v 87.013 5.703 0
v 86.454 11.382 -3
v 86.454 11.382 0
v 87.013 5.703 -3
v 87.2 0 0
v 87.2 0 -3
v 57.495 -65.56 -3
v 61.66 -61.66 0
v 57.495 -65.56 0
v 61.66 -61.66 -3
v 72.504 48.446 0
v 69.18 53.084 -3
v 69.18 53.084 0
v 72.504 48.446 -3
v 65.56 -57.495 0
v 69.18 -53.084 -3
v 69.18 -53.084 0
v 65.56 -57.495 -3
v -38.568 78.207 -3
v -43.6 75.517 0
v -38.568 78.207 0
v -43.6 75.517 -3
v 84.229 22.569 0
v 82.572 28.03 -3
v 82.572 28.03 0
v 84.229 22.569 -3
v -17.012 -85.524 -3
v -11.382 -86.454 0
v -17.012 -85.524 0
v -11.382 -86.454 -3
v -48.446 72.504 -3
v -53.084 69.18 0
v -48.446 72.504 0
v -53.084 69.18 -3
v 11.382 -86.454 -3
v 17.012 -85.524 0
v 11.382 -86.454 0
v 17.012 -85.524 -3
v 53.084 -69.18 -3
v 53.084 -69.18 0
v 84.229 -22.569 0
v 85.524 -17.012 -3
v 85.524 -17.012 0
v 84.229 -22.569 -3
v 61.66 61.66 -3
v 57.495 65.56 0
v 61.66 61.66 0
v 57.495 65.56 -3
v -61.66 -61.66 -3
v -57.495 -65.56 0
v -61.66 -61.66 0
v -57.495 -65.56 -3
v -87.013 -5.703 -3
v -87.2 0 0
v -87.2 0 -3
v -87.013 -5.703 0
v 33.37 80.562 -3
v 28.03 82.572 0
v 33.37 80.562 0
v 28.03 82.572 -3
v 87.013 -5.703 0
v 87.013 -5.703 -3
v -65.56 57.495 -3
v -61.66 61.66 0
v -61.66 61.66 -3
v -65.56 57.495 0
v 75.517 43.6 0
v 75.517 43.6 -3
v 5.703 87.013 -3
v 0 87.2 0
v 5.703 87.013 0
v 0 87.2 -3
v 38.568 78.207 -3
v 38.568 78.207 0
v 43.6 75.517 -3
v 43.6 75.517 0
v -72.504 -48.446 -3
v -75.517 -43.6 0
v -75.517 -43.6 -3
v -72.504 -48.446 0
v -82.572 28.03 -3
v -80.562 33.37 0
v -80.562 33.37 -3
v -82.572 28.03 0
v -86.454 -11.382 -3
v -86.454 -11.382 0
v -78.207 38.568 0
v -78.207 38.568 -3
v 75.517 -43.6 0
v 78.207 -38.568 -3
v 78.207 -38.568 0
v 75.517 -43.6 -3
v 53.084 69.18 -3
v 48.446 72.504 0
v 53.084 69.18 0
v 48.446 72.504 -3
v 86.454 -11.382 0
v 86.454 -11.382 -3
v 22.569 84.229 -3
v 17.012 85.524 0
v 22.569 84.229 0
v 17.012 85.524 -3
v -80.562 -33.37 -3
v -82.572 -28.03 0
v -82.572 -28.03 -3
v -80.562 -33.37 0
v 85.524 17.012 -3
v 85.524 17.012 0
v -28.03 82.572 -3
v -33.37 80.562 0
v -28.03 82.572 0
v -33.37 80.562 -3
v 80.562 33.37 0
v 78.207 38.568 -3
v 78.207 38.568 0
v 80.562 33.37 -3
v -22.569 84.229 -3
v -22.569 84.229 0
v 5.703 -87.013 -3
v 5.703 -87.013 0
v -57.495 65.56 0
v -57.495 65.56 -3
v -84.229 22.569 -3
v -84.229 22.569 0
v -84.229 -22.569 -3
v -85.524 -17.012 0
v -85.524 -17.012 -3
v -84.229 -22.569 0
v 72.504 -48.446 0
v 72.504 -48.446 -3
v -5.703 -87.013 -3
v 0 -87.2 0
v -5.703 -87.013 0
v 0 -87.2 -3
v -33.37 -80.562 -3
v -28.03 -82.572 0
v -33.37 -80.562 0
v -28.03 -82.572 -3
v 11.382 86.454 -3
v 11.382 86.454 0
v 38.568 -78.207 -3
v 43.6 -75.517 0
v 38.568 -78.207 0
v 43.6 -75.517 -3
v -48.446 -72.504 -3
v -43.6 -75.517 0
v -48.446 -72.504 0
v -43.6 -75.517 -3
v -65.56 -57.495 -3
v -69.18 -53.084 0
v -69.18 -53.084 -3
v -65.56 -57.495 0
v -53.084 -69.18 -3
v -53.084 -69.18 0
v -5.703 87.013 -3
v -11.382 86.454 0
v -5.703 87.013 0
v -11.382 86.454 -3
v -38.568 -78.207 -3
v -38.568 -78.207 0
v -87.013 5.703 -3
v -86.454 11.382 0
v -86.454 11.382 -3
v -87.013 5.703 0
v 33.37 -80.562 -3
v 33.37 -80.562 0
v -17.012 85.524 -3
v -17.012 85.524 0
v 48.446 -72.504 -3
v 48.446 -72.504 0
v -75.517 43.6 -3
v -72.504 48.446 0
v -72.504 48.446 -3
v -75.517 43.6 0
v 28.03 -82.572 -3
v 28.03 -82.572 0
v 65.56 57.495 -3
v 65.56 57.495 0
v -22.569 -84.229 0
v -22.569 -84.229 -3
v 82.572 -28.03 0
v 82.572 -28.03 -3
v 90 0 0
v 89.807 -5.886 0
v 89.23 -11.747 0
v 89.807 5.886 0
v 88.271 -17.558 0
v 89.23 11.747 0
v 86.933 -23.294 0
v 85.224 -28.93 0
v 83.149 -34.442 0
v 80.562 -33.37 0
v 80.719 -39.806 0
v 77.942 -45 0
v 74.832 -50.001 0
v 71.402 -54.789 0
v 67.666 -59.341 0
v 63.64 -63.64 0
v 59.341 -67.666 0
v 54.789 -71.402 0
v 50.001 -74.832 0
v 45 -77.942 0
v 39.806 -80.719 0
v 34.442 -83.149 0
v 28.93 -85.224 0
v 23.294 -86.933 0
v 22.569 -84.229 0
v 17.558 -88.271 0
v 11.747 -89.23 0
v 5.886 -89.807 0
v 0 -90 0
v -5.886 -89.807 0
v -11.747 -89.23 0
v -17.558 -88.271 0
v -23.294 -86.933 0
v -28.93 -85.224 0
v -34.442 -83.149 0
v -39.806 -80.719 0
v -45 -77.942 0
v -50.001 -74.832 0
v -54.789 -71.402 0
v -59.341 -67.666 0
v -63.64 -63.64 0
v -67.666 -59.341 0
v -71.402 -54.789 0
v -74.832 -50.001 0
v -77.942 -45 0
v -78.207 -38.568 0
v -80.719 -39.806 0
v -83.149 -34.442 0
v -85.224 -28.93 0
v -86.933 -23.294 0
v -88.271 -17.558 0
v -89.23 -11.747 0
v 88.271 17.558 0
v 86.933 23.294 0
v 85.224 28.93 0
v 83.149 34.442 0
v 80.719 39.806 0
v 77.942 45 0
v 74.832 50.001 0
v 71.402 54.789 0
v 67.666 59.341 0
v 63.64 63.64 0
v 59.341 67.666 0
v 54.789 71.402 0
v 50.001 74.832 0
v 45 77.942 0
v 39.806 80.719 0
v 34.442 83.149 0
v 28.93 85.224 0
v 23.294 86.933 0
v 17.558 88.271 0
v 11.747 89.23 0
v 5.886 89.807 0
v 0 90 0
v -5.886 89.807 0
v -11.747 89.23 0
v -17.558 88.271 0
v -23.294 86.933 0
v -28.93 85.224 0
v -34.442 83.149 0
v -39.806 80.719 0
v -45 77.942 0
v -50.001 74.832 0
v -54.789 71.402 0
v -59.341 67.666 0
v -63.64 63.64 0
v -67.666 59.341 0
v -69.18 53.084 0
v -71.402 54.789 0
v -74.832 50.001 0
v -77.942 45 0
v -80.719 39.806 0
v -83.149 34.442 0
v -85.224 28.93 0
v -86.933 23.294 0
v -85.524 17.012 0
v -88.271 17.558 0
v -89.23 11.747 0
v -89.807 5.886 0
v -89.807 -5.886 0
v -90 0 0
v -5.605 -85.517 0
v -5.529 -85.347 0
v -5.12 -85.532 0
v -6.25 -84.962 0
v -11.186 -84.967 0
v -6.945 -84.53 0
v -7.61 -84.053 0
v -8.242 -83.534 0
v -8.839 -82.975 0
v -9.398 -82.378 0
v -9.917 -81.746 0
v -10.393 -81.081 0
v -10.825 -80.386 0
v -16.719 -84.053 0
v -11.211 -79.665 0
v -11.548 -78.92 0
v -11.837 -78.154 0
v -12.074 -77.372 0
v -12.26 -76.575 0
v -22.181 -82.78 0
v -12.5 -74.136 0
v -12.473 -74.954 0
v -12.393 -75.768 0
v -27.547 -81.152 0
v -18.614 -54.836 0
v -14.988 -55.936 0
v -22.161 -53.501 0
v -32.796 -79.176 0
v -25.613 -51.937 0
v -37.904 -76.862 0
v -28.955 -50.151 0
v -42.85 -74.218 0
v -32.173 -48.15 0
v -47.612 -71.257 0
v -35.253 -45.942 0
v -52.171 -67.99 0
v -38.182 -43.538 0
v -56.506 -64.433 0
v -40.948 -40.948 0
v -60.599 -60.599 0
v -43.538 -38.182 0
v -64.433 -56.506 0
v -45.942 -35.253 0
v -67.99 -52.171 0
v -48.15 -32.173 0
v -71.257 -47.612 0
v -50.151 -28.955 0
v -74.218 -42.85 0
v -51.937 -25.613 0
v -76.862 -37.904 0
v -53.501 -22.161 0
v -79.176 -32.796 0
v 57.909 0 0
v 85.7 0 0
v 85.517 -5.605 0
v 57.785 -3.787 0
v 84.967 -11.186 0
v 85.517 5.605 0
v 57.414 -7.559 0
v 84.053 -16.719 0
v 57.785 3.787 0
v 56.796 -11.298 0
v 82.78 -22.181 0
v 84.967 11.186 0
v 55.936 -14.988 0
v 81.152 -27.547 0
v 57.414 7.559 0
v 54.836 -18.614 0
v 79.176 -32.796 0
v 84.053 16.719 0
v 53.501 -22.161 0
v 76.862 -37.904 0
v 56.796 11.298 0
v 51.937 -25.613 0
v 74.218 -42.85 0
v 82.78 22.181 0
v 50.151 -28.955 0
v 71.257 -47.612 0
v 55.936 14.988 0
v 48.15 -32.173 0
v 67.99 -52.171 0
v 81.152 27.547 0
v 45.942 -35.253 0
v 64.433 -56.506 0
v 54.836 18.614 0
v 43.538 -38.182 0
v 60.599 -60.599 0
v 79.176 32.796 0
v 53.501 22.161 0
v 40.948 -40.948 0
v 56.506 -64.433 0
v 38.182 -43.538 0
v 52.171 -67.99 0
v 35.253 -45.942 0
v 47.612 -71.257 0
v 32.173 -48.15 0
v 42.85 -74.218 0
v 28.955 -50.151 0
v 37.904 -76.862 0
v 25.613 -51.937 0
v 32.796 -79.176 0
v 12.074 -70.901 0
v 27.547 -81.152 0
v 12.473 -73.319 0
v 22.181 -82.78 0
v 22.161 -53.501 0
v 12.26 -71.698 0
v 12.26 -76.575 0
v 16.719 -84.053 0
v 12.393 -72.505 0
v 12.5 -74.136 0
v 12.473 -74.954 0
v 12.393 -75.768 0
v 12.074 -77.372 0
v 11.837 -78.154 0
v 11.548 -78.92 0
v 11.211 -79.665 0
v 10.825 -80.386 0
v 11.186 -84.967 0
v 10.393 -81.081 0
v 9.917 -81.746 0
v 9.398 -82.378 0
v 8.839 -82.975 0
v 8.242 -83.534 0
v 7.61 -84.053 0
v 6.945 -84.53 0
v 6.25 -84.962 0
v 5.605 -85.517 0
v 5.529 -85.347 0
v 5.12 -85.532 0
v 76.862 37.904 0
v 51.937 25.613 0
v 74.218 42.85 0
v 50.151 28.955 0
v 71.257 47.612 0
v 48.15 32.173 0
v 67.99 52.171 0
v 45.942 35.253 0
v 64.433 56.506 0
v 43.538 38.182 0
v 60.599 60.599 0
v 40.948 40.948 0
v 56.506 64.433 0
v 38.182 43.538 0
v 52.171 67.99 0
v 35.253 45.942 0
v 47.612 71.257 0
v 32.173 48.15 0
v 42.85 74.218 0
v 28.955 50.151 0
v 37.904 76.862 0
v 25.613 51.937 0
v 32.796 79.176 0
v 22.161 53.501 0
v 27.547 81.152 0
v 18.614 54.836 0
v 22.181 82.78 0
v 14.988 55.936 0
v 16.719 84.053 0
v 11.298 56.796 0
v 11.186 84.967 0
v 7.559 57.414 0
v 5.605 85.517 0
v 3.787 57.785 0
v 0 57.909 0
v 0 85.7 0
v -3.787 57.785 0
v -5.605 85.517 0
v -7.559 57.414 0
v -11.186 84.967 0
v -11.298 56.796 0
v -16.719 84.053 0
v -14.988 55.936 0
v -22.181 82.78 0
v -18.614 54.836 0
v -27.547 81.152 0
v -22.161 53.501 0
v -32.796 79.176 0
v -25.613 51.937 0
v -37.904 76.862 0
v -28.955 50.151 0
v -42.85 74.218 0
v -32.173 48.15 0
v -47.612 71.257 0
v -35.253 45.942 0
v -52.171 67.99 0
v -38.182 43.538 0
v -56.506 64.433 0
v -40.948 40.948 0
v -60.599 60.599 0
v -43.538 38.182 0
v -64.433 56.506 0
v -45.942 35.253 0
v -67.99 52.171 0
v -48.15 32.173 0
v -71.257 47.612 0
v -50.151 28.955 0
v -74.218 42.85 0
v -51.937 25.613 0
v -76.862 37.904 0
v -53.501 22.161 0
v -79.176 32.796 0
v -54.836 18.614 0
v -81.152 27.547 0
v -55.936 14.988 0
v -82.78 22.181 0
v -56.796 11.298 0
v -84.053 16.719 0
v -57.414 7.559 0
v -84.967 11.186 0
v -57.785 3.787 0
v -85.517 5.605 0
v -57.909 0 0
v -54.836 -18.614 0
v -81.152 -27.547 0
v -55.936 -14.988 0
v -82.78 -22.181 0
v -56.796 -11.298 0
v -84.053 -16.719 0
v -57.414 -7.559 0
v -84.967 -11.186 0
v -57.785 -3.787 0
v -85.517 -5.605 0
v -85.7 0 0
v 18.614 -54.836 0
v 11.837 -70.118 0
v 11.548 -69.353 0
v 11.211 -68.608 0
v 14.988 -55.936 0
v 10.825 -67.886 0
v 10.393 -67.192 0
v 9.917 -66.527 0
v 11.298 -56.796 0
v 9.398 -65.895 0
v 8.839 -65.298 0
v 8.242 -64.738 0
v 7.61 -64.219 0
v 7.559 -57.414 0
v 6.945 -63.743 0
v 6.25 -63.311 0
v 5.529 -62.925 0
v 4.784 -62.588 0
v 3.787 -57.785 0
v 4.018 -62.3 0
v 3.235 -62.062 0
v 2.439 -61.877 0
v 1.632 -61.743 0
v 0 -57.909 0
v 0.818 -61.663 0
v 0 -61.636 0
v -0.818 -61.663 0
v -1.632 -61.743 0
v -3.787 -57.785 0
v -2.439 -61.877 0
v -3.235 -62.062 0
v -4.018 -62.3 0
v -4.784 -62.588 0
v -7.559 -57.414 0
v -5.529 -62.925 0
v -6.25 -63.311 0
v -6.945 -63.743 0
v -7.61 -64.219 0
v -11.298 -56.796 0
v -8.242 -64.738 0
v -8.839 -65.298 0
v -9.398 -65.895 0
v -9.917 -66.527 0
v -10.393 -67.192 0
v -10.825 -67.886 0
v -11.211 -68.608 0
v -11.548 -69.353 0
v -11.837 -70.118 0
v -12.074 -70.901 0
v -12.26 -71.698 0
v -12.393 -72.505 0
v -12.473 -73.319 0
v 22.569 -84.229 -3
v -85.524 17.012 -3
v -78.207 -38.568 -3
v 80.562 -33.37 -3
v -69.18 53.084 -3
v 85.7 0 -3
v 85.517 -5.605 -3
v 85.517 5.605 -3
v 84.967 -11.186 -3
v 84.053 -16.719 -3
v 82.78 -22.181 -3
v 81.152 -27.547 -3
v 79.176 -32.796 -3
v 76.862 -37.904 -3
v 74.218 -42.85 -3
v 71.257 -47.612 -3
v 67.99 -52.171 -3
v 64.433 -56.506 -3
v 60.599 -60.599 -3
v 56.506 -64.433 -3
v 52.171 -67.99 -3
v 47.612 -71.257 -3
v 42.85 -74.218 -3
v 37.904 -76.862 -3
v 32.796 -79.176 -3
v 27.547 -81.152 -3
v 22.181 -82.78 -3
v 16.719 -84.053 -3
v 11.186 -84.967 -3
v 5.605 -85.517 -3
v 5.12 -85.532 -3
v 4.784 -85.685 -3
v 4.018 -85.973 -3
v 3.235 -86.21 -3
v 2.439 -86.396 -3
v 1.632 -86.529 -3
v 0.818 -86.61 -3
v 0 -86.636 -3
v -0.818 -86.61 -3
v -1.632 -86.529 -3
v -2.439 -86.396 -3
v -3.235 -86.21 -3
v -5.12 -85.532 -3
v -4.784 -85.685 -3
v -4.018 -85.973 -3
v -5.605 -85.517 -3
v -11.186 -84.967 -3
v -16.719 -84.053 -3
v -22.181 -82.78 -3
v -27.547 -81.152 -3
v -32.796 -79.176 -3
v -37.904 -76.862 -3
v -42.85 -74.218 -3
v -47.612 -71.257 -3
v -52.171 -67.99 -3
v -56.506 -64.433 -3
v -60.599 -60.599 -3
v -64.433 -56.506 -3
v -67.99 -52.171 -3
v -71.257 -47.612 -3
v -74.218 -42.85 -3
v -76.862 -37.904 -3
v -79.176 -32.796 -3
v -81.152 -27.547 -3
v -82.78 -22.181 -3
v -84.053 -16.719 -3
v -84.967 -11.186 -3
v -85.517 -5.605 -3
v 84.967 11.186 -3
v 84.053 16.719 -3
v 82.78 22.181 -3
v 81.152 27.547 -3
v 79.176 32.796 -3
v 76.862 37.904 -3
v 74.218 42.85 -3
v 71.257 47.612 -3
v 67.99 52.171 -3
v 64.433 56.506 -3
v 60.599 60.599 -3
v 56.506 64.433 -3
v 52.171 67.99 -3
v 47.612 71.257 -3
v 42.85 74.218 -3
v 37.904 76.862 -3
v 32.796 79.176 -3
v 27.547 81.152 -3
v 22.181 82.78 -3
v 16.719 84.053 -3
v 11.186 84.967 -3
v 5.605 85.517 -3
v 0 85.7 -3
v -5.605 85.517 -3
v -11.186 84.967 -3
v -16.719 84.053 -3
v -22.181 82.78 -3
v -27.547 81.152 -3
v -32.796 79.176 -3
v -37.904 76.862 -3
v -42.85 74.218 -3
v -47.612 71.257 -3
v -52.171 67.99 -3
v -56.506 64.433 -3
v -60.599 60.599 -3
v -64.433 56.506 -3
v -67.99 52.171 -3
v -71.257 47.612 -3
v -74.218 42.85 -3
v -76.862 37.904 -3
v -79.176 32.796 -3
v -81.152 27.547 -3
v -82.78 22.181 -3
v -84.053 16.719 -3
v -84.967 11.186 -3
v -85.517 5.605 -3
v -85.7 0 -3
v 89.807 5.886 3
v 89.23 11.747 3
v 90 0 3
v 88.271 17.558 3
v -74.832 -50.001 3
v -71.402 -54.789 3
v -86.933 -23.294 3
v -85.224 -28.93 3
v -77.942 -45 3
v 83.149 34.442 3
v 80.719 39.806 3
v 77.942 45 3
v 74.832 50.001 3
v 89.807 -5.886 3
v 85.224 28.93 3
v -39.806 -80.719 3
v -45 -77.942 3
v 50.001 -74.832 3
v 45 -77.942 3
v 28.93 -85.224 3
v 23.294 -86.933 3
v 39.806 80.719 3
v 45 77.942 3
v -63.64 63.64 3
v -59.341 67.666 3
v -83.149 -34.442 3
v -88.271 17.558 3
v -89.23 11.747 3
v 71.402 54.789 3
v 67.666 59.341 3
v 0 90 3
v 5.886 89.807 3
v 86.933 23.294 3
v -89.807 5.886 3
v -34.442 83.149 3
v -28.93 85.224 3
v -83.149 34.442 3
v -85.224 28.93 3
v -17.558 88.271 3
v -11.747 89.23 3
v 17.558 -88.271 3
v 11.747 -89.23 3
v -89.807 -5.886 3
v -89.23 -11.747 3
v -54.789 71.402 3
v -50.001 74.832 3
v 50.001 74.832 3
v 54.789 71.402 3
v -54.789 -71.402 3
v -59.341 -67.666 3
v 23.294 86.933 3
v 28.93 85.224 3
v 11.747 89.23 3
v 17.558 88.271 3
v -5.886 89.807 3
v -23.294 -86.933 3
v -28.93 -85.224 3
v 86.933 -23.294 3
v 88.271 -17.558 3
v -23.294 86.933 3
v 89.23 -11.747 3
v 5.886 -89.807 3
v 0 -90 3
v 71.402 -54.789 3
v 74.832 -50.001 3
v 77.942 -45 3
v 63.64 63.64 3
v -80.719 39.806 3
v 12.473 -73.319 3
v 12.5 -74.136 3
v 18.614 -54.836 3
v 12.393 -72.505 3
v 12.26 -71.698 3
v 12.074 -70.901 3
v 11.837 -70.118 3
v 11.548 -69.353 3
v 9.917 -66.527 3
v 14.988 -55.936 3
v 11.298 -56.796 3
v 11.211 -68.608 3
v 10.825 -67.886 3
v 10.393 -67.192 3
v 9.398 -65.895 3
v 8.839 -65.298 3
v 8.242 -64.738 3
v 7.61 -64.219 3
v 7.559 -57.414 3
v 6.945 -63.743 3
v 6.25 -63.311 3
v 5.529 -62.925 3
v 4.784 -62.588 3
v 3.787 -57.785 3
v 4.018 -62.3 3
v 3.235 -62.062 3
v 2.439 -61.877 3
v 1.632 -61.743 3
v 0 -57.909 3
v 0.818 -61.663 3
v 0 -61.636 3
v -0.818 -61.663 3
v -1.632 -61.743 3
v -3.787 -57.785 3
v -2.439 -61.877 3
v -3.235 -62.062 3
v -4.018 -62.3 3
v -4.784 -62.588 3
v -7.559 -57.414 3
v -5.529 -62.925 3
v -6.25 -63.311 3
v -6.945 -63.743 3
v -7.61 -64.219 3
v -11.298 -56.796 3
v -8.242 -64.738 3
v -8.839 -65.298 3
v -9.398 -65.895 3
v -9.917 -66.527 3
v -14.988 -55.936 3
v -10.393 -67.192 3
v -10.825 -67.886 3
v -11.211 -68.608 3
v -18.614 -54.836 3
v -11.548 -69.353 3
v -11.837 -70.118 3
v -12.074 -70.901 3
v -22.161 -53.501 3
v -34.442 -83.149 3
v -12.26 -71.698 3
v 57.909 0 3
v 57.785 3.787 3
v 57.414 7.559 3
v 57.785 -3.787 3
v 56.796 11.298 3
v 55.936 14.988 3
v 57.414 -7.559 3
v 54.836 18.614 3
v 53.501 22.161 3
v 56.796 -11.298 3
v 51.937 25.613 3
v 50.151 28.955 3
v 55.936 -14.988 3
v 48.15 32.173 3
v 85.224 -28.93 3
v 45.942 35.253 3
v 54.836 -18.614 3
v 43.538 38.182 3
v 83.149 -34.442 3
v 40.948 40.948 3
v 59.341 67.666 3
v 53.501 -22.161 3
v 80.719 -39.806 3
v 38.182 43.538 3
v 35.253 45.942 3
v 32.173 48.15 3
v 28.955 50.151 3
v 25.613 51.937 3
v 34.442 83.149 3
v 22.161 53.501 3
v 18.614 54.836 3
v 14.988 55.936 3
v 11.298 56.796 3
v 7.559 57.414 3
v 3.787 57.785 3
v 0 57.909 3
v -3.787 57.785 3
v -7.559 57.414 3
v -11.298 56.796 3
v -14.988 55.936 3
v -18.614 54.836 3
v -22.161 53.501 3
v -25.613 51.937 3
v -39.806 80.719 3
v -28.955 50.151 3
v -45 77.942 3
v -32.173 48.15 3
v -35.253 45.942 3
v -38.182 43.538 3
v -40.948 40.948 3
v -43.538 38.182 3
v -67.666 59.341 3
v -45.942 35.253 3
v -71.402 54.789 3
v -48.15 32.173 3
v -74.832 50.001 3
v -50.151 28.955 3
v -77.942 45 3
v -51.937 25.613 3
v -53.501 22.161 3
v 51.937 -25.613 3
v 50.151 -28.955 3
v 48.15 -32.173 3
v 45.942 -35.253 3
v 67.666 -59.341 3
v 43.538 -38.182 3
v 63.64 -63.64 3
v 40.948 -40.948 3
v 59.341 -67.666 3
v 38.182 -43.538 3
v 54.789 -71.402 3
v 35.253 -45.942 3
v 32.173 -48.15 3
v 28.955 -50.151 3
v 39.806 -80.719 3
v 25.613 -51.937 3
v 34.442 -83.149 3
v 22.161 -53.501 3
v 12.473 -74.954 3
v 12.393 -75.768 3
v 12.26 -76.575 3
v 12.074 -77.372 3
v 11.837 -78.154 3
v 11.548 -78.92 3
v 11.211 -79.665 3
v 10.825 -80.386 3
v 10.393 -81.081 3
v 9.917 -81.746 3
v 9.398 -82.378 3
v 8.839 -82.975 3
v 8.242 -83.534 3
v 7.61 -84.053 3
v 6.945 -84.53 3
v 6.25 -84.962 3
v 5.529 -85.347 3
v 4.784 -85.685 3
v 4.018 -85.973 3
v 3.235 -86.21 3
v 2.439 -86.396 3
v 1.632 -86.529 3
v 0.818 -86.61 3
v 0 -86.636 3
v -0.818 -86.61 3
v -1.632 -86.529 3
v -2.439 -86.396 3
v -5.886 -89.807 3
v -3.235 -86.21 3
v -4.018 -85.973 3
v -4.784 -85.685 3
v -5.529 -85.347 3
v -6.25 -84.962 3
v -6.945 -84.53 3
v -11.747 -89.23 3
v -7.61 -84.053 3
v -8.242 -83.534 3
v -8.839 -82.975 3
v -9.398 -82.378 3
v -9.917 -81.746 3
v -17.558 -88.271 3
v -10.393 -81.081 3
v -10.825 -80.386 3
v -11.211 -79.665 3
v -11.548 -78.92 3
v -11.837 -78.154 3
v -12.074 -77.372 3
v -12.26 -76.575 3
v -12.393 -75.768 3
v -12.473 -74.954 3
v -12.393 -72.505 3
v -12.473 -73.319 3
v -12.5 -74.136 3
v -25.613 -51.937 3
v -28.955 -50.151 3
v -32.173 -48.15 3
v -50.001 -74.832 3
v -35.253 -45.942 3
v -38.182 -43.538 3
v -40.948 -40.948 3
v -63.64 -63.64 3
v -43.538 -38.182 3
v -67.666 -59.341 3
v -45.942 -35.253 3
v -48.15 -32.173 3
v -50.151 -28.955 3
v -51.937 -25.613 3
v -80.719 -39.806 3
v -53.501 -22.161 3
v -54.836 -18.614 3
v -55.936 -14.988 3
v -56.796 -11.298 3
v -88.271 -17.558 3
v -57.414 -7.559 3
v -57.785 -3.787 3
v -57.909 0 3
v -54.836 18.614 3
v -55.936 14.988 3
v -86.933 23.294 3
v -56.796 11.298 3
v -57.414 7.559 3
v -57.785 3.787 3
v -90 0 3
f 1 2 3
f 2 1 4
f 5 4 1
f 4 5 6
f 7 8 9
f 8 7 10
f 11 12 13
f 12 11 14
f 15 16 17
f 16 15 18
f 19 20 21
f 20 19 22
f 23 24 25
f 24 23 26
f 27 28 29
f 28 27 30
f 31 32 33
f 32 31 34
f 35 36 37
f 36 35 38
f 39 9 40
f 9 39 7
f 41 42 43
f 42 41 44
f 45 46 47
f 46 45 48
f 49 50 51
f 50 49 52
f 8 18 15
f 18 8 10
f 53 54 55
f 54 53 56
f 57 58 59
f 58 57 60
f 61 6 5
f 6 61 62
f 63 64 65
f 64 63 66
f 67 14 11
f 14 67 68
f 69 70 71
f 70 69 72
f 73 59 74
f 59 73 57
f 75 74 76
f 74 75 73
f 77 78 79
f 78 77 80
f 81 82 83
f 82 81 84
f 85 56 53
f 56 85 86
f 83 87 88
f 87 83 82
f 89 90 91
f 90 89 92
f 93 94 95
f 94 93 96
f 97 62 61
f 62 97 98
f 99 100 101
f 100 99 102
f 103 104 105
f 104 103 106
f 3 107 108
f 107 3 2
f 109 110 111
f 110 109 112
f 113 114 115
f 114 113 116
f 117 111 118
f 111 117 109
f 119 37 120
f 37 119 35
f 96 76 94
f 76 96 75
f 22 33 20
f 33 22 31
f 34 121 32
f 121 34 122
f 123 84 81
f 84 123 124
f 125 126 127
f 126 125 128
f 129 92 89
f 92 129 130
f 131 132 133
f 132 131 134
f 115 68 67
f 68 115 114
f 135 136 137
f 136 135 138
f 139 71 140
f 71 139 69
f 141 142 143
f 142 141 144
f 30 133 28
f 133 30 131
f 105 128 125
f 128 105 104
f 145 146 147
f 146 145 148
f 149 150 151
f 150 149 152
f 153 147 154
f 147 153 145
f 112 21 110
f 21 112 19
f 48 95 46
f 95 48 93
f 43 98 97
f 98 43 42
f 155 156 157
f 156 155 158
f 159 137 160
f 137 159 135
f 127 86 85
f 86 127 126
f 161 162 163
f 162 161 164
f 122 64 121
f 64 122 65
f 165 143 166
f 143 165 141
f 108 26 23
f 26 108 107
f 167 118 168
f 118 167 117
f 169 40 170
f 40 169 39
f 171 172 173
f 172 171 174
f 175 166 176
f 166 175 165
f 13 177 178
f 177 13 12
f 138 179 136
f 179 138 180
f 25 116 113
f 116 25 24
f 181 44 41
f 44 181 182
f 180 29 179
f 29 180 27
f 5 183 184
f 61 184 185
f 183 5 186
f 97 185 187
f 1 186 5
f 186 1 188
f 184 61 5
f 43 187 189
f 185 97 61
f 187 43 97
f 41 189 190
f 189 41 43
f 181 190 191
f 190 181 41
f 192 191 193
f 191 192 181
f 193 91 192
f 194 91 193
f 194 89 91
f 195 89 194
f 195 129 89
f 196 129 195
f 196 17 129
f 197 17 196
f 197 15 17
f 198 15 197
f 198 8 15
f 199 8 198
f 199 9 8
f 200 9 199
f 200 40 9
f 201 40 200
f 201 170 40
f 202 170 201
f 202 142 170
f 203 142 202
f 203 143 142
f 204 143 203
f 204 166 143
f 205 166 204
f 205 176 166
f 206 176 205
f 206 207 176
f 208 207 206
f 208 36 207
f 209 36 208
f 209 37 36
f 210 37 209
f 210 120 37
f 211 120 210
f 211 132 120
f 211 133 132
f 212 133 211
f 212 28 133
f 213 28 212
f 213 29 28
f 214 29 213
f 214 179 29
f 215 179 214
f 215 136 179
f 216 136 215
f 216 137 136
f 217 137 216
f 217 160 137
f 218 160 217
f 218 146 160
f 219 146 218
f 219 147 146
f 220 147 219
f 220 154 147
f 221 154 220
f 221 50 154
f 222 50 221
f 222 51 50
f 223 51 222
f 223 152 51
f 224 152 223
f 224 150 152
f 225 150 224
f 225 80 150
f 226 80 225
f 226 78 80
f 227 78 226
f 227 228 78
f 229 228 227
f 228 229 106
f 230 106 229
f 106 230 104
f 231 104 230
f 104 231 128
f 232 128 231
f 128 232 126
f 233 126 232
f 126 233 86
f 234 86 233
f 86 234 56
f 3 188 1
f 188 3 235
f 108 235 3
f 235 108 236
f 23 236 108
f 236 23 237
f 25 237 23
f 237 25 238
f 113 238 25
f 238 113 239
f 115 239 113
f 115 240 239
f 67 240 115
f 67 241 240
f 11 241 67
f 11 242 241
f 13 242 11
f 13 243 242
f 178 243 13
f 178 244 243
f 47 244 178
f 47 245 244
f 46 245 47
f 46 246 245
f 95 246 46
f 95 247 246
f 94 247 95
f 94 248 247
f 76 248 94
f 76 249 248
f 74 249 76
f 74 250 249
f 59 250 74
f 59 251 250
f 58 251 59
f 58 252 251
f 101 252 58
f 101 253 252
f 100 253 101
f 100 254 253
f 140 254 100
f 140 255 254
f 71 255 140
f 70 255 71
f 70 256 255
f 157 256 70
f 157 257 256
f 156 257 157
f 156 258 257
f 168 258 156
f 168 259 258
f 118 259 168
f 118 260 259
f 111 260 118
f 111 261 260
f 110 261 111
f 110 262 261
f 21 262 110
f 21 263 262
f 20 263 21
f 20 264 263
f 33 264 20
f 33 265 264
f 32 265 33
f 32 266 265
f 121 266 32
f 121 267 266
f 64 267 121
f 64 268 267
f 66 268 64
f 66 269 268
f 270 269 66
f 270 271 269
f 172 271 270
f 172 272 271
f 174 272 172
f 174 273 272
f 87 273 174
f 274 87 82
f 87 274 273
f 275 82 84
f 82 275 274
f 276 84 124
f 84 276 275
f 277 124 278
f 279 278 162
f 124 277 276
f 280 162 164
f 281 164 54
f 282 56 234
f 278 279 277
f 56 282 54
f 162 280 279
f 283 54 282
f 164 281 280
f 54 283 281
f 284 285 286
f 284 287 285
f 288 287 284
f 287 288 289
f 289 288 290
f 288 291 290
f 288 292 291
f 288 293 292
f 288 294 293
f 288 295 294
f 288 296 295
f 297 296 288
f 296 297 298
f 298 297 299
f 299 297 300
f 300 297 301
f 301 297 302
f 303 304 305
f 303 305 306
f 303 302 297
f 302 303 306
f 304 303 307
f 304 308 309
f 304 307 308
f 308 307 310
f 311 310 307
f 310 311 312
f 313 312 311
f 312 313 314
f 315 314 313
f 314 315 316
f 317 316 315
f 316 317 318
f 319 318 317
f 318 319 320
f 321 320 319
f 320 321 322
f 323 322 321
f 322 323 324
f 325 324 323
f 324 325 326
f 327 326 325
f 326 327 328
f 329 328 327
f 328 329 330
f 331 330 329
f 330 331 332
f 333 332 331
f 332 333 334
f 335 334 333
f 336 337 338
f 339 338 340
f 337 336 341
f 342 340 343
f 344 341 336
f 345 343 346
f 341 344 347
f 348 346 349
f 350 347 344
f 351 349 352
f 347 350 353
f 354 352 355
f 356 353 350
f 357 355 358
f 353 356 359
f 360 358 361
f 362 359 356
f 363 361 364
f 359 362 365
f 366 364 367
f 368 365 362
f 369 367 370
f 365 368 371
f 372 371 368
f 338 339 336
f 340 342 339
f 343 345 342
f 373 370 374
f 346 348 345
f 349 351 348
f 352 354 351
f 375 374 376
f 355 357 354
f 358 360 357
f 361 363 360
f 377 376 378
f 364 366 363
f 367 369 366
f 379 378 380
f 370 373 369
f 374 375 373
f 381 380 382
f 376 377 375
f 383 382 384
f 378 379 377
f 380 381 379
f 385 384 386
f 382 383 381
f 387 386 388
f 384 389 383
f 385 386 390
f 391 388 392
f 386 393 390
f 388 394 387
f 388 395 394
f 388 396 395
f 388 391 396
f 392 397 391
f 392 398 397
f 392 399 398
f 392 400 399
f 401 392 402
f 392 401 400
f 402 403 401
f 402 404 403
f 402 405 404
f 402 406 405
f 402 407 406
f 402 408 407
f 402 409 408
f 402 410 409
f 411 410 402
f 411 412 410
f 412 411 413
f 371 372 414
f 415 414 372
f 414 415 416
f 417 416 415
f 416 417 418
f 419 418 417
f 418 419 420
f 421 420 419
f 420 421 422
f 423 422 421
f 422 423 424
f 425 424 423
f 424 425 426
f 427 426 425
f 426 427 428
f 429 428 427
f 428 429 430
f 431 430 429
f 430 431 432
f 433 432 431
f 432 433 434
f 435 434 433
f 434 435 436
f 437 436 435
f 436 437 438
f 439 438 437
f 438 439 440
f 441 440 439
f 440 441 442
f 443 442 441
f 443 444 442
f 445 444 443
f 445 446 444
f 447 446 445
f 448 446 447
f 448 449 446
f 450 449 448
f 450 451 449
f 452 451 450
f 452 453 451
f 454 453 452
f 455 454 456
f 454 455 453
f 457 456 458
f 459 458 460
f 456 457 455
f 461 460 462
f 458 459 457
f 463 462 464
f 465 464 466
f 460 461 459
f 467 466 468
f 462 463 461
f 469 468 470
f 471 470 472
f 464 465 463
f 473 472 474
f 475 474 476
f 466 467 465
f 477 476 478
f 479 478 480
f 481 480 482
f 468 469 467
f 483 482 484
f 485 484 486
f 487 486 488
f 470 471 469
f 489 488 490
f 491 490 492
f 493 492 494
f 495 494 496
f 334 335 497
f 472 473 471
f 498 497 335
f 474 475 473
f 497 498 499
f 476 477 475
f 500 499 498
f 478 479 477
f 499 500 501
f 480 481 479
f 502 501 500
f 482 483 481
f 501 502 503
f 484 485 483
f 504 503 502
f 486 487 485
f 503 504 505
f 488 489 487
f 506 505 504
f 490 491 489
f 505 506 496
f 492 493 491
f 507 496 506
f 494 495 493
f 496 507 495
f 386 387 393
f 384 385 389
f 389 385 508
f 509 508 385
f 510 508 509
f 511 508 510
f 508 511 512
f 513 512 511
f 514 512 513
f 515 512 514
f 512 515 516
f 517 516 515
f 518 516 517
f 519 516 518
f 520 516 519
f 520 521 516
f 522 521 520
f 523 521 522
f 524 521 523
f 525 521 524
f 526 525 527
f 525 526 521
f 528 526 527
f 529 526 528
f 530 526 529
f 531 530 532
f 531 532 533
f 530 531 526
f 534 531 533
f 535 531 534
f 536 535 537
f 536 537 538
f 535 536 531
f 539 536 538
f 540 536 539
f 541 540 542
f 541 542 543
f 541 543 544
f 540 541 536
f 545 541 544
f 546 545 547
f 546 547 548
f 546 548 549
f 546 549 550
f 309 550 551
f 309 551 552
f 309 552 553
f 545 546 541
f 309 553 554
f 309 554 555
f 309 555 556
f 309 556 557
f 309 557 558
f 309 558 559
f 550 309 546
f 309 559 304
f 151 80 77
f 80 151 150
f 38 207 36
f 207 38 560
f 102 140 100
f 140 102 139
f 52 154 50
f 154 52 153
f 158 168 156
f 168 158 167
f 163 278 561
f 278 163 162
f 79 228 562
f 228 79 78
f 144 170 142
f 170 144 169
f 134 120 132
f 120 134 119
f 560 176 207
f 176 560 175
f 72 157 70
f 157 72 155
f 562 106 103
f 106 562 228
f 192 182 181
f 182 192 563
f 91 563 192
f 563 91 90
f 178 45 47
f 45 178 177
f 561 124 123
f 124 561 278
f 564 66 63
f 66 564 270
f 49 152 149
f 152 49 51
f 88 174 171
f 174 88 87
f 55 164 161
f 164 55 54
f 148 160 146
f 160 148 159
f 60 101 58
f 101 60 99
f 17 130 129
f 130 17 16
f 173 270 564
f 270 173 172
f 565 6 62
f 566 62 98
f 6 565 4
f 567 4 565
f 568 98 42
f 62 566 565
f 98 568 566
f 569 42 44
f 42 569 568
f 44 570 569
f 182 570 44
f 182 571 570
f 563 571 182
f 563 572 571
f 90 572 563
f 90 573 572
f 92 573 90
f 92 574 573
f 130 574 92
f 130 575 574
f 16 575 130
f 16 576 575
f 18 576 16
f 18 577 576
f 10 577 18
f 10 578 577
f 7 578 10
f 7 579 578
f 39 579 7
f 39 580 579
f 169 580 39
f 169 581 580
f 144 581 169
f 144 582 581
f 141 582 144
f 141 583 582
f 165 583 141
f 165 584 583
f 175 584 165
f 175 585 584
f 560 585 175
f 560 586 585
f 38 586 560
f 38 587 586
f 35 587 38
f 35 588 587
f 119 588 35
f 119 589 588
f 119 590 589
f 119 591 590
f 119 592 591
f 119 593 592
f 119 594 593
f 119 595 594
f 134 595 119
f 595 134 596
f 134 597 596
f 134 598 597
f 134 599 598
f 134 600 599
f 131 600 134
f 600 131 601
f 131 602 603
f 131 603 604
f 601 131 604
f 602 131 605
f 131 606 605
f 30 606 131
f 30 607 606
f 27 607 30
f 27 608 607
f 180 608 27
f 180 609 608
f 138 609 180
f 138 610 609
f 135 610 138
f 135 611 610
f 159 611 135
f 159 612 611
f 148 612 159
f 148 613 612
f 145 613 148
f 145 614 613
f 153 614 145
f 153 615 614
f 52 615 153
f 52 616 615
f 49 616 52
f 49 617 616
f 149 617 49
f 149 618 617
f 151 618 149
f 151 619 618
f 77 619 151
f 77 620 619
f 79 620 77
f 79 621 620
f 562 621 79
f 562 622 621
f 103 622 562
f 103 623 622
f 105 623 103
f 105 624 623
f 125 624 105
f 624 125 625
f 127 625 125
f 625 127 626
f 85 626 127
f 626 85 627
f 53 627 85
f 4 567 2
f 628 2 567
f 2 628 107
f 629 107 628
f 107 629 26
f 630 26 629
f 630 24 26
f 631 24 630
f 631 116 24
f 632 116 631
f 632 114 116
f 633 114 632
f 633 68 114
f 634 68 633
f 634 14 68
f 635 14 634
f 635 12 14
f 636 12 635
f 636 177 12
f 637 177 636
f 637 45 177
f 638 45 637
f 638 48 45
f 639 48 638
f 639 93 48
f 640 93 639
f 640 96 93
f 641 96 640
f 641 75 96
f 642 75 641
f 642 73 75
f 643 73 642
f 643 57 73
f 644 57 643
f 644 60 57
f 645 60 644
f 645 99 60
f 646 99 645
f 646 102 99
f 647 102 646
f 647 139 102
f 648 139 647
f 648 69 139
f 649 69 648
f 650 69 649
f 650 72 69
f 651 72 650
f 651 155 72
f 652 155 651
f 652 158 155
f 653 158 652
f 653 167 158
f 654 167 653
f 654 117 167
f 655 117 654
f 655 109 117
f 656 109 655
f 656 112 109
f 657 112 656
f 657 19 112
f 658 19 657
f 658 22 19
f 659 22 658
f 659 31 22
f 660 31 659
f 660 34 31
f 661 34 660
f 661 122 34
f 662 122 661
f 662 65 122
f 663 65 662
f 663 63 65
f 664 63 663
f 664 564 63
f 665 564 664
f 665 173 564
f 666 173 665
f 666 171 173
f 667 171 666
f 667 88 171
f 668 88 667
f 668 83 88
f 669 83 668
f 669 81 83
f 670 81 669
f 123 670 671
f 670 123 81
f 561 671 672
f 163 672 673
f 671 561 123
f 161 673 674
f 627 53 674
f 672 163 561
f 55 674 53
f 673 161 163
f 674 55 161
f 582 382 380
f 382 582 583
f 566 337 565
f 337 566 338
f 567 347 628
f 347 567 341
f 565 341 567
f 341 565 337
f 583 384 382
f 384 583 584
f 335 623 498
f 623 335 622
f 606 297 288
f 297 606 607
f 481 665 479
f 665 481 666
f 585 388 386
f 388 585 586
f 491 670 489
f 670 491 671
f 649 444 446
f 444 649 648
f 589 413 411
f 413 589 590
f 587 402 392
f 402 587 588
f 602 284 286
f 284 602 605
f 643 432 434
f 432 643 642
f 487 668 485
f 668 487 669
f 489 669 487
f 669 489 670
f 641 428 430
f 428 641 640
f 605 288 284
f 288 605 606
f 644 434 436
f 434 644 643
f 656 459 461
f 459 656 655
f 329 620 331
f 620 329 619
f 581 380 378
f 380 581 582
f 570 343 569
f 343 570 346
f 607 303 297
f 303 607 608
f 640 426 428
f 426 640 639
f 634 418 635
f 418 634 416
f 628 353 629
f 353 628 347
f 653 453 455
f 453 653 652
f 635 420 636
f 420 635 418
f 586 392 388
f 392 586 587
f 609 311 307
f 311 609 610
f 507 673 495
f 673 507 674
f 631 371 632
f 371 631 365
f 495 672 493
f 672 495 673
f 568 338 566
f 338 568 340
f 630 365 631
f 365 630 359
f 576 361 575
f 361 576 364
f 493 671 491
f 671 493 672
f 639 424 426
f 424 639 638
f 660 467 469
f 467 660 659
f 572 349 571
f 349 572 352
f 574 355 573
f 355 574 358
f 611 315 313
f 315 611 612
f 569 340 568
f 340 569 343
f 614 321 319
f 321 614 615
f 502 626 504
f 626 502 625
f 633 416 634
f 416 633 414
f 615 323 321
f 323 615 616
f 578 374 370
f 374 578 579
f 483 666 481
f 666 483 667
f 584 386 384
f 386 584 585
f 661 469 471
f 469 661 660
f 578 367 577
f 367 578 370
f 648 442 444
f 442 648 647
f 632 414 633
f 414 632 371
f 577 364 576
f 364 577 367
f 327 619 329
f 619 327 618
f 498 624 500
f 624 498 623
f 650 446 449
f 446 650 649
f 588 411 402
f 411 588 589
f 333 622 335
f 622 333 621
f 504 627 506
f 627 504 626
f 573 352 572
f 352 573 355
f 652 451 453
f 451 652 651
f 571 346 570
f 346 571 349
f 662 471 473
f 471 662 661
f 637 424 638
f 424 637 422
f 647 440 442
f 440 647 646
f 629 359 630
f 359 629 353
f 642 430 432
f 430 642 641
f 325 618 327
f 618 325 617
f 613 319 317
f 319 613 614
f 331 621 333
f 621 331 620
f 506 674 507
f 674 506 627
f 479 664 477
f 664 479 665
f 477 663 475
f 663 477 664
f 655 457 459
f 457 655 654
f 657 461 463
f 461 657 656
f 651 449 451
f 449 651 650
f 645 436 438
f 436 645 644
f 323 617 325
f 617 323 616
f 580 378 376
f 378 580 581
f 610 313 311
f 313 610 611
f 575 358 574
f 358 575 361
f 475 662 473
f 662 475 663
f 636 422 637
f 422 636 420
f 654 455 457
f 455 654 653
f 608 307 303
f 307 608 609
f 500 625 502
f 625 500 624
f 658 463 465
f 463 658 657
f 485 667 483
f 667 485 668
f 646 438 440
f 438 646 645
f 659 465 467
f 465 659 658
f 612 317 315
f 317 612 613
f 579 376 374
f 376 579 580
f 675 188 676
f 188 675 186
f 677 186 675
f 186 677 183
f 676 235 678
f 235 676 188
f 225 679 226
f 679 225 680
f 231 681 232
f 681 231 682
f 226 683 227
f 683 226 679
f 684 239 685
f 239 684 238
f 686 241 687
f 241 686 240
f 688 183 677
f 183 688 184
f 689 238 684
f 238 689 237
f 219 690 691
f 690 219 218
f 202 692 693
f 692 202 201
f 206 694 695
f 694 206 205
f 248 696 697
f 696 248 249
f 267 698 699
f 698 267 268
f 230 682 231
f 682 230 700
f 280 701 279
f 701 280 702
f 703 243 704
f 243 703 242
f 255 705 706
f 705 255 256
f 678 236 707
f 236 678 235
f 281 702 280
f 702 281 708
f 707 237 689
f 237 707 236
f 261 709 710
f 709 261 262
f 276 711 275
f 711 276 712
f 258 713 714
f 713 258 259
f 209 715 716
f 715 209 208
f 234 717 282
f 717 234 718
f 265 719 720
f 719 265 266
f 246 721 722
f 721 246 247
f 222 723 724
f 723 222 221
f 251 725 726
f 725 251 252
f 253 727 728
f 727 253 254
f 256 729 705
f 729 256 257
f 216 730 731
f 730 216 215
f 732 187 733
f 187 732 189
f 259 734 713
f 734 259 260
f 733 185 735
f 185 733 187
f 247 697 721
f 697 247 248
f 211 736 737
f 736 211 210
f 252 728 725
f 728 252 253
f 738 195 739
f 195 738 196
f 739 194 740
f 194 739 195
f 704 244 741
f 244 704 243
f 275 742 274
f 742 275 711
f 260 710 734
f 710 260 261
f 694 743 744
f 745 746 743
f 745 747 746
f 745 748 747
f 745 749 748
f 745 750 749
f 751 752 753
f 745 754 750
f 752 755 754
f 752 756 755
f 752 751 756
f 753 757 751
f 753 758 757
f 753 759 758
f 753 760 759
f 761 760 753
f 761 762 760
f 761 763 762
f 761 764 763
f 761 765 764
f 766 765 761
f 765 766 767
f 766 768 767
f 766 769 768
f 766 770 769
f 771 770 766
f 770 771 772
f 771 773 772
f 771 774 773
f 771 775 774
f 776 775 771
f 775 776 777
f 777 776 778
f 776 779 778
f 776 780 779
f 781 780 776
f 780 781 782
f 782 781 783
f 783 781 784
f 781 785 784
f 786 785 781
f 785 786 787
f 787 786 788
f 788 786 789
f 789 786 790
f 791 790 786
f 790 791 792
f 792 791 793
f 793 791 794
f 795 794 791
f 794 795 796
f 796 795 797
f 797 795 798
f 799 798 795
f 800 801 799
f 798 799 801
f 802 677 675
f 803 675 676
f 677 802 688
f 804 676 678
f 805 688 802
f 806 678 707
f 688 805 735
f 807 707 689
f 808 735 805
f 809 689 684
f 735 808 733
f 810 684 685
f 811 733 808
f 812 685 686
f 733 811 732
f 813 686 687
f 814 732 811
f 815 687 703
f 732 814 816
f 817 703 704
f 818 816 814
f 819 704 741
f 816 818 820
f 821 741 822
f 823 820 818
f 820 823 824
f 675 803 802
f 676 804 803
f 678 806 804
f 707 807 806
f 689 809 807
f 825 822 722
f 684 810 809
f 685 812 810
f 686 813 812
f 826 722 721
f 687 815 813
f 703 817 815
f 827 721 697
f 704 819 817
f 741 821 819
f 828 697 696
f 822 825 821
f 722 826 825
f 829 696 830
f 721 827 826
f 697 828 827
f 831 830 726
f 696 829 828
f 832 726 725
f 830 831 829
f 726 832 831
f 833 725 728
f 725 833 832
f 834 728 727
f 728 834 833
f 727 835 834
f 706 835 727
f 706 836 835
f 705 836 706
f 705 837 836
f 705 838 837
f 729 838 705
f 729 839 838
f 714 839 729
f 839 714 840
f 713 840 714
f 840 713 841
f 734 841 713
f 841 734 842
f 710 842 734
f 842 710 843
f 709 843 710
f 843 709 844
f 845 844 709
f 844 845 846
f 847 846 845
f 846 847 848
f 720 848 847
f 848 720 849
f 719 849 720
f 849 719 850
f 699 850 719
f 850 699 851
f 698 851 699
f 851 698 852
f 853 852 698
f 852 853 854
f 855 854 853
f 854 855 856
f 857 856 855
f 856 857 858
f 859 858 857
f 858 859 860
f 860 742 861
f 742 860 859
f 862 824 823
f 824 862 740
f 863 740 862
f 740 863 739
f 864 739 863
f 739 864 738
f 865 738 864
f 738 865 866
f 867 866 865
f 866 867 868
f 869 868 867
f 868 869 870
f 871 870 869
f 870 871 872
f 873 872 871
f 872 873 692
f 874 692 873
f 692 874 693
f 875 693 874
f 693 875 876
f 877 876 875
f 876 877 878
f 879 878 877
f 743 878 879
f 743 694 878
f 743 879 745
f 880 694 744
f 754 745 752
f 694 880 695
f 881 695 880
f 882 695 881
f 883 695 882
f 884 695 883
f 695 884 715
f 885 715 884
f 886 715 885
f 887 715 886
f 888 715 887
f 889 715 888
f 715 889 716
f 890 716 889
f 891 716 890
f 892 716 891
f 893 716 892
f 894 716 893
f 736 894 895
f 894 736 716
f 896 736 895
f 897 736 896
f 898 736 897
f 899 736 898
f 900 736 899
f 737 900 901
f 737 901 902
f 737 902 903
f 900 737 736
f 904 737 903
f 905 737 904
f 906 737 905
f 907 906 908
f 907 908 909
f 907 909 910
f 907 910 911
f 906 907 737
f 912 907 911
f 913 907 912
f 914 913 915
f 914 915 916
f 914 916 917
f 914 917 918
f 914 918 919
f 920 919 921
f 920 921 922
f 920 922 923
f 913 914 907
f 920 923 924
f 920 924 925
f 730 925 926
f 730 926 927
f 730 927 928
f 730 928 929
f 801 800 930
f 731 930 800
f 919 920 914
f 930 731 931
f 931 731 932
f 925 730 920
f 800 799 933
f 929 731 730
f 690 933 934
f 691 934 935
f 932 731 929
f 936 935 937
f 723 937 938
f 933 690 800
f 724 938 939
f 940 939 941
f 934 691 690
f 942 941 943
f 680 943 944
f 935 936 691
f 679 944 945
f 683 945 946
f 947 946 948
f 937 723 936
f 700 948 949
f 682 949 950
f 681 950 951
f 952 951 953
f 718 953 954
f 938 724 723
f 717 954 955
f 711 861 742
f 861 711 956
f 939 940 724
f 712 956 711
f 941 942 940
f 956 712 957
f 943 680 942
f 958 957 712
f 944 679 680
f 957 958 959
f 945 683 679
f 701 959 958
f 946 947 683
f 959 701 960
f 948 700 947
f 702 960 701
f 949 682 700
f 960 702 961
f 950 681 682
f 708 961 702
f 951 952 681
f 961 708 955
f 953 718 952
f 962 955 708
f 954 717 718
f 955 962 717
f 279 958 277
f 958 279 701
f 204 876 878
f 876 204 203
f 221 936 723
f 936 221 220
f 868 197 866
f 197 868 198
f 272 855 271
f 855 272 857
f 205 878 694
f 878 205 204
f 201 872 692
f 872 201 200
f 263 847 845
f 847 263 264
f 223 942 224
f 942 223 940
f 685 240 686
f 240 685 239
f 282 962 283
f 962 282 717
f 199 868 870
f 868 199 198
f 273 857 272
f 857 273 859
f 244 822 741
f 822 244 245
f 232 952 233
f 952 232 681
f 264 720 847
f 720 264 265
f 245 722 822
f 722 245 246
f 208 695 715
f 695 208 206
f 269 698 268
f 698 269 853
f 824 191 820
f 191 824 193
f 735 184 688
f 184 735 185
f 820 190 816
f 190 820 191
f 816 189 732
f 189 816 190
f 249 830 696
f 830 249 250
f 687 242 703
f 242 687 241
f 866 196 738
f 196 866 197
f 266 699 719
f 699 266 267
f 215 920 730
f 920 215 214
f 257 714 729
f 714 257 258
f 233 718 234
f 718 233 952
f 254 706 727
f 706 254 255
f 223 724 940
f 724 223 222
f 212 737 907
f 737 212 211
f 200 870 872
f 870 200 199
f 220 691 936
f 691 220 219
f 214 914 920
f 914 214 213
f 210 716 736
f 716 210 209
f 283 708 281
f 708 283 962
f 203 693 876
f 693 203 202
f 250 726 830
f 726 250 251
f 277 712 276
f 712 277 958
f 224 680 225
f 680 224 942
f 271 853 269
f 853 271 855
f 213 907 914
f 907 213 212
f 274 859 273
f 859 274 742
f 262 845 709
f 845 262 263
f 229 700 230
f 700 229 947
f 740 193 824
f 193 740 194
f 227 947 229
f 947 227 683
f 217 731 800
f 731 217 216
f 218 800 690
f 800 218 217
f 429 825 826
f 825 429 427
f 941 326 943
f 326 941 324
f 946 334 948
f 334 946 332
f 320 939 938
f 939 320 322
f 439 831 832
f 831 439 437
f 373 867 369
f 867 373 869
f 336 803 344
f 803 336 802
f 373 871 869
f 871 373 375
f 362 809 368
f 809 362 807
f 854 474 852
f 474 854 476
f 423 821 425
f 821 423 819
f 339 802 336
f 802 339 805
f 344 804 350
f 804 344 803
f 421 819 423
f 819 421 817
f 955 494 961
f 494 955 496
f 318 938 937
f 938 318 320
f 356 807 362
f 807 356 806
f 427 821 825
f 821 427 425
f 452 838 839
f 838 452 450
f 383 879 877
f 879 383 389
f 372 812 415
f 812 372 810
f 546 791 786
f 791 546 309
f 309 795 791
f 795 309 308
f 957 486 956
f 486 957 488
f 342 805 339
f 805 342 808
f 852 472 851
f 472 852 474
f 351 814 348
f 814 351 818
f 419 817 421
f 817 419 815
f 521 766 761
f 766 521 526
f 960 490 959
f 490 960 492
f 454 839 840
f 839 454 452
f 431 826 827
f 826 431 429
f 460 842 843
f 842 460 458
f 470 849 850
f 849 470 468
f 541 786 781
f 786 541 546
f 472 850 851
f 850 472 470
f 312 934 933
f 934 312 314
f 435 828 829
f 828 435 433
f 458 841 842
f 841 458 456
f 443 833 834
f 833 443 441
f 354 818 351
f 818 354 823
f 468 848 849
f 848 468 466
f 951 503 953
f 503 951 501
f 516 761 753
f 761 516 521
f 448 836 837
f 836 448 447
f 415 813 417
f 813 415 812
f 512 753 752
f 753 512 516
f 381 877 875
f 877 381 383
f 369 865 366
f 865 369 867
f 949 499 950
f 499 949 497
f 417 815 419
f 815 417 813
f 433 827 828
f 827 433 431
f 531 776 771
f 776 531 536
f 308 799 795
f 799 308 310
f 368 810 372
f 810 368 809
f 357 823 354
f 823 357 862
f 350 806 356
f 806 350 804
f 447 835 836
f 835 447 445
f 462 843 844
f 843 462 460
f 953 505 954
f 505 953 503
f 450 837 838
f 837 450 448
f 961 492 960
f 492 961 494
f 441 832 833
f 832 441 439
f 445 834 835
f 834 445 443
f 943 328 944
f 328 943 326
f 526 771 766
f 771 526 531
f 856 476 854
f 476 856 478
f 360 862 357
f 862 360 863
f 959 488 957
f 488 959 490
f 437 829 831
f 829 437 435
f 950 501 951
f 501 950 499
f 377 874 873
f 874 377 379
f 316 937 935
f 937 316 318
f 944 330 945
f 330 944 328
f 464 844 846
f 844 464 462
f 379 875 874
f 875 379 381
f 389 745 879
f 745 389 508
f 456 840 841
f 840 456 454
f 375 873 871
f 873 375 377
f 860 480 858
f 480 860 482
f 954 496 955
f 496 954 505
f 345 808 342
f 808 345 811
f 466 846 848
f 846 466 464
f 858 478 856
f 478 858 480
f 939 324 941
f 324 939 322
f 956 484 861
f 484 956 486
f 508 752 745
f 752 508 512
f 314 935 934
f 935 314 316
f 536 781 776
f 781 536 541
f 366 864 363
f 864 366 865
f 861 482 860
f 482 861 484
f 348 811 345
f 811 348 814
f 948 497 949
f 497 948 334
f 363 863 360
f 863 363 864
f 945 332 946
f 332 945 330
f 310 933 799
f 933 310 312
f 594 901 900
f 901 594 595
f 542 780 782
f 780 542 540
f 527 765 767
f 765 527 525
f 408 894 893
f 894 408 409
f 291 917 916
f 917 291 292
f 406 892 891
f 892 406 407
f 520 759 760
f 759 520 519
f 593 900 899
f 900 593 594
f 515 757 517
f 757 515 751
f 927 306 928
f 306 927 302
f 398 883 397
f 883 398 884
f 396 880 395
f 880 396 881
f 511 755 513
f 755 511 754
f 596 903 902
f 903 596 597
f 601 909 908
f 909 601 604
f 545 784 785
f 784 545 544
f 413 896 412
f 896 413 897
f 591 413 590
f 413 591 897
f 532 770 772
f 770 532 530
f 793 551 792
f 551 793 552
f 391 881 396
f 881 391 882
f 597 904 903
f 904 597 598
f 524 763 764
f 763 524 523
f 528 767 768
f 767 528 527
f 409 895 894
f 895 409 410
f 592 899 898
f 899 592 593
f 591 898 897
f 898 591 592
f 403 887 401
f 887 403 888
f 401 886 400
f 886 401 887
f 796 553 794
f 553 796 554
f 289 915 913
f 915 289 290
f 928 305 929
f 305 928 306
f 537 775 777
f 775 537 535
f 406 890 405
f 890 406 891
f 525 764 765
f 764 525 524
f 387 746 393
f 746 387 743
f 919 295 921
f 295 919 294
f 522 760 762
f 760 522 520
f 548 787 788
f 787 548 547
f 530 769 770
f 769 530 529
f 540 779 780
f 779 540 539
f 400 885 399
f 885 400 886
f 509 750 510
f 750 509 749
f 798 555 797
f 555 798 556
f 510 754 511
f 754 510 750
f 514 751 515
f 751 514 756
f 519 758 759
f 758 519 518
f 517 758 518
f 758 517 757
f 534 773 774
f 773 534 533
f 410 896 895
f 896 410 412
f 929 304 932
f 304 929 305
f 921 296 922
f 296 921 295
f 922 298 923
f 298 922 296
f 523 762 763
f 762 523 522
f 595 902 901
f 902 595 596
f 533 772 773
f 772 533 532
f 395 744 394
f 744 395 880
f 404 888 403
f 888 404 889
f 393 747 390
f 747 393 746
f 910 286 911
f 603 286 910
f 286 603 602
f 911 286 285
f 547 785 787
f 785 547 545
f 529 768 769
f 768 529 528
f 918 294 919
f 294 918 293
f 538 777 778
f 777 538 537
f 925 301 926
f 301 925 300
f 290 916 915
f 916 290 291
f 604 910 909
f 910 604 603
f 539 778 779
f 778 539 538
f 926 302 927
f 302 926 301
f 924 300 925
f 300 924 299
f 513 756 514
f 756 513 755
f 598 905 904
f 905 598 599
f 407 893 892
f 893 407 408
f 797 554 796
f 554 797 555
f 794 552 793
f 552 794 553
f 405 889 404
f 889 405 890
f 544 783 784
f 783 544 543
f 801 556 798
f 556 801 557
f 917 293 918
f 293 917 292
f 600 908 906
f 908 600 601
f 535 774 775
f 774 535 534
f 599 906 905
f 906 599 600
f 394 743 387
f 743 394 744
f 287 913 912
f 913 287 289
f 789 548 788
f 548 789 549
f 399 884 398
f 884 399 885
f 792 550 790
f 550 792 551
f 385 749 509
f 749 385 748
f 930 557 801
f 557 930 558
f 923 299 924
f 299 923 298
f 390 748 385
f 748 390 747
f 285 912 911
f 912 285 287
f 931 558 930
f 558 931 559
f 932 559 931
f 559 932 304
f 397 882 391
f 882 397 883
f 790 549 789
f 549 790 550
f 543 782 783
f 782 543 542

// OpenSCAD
// file: params.scad
// =============================================================================
// GreenThumbs Pot-Orchid v1 — Centrale parametre (ADR 012)
// =============================================================================
// Orkideen bliver i sin dyrkningspotte (12cm), som står i en konisk SKÅL.
// Lageret er en RING rundt om skålen; elektronik + batteri i BAY'en under.
// Det hele står i en pyntepotte.
//
//   ┌ ring-låg ─┐   ┌─ dyrkningspotte ─┐   ┌ ring-låg ┐
//   │  LAGER-   │   │     (bark)       │   │  RING    │
//   │  RING     │ ~~│~~ soak-niveau ~~~│~~ │          │  ← skålens kant =
//   │ ~~~~~~~~  │ S K Å L (konisk)     │   │ ~~~~~~~~ │    fysisk soak-loft
//   ╞═══════════╧══════════════════════╧═══╧══════════╡  ← tank-gulv
//   │  BAY: 2× 18650, pumpe, XIAO, H-bro, boost       │
//   └─────────────────────────────────────────────────┘
//
// Soak: pumpen fylder skålen fra ringen, til vandet løber over skålens kant
// og tilbage i ringen (selvnivellerende). Dræn: pumpen baglæns, til den
// berøringsfri sensor under skålens bund melder tom.
//
// Konvention: mm, grader. z = 0 er bunden af hver del.
// =============================================================================

$fn = 96;
print_tolerance = 0.3;

// ----------------------------------------------------------------------------
// 1. Pyntepotte (konvolut) — fra produktside, IKKE målt (bruger, 2026-10-21)
// ----------------------------------------------------------------------------
cachepot_inner_d    = 210;      // indvendig diameter ved åbningen
cachepot_max_pot_d  = 190;      // "maks. diameter urtepotte" ifølge produktsiden
cachepot_inner_h    = 185;      // anslået: ydre 200mm minus bund
cachepot_bottom_r   = 15;       // anslået radius på den buede bund-kant

// ----------------------------------------------------------------------------
// 2. Dyrkningspotte (12cm Phalaenopsis) — MÅL DIN POTTE og ret her
// ----------------------------------------------------------------------------
pot_top_d    = 120;
pot_bottom_d = 90;
pot_h        = 110;
function pot_r(h) = pot_bottom_d / 2 + (pot_top_d - pot_bottom_d) / 2 * h / pot_h;

// ----------------------------------------------------------------------------
// 3. Tank: skål (center) + lager-ring, ét print med fælles gulv
// ----------------------------------------------------------------------------
tower_d      = 180;             // ≤ cachepot_max_pot_d; plads til luft om tårnet
tank_wall    = 2.5;
tank_floor_t = 4;              // barrieren mellem vand og elektronik — massivt
ring_outer_r = tower_d / 2 - tank_wall;   // ringens indvendige yderradius

// Skål: konisk, følger pottens taper med fast spalte (spalten = vand-vej ind
// til pottens side-slidser og plads til at løfte potten)
bowl_gap    = 4;
bowl_wall   = 2.5;
feet_h      = 2;                // radiale ribber på skålens bund (potten må
                                // ikke tætne sine bundhuller mod gulvet)
soak_depth  = 68;               // over pottens bund = ~62% af pottehøjden
z_pot_bottom = tank_floor_t + feet_h;
bowl_rim_z   = z_pot_bottom + soak_depth;  // skålens kant = soak-loft

bowl_r_in_bottom = pot_r(0) + bowl_gap;
bowl_r_in_top    = pot_r(soak_depth) + bowl_gap;

// Slange-kanal: lodret udbuling i skålens væg ved 180° — slange A går ned
// her til sumpen (spalten på 4mm er for smal til en Ø6-slange)
hose_ch_angle = 180;
hose_ch_w     = 10;             // tangentielt
hose_ch_depth = 8;              // radialt ud over skålens indervæg
sump_d        = 10;
sump_depth    = 1.5;

// Lager-ring: max vandstand SKAL ligge under skålens kant (ellers løber
// lageret tilbage i skålen). Overløb udad som sidste udvej.
ring_overflow_z     = bowl_rim_z - 6;
ring_overflow_d     = 5;
ring_overflow_angle = 0;
ring_wall_h         = bowl_rim_z + 9;      // ringens ydervæg op til låget
float_full_z        = ring_overflow_z - 5; // "lager fuldt"-float (refill-bip)
float_low_z         = tank_floor_t + 15;   // "lager lavt"-float

// Float-beslag på ringens YDERVÆG (ringen er bredest dér). Mini-float med
// M8-stamme skrues i hullet og hænger float_hang under armen. Kablet føres
// langs ringen til skaktens top.
float_angle      = 125;
float_arm_l      = 18;          // radialt ind fra ydervæggen
float_arm_w      = 14;
float_arm_t      = 3;
float_hang       = 10;          // arm over flyderens koblingspunkt (mini-float)
float_hole_d     = 8.5;         // M8-stamme
float_hole_from_wall = 11.5;    // flyder Ø~18 går fri af væg og skål

// Tør skakt i ringen: fra bay'en op til over ringens max — slanger og
// kabler går her (ingen huller under vandlinjen ud mod elektronikken)
conduit_angle = 160;
conduit_od    = 17;
conduit_id    = 13;
conduit_r     = ring_outer_r - conduit_od / 2 - 1;
conduit_top_z = ring_overflow_z + 8;

// Ring-låg: hviler på ringens ydervæg, går fri af potten
lid_t          = 3;
lid_inner_r    = pot_r(ring_wall_h + lid_t - z_pot_bottom) + 2;
refill_hole_d  = 25;
refill_angle   = 270;

// ----------------------------------------------------------------------------
// 4. Bay (elektronik + batteri) — åben top, tank-gulvet er loftet
// ----------------------------------------------------------------------------
bay_wall      = 2.5;
bay_floor_t   = 3;
bay_h         = 47;             // NKP-pumpe ~41mm høj liggende (forhandler-mål)
bay_chamfer   = 10;             // 45° fas forneden mod pyntepottens buede bund
collar_h      = 4;              // krave på bay-rimmen centrerer tanken

cell_d   = 18.6;                // 18650
cell_l   = 65;
cell_count = 2;                 // 1S2P
cradle_y   = 40;                // batteriet på den ene side, pumpen på den anden

// ----------------------------------------------------------------------------
// 5. Beregnede størrelser
// ----------------------------------------------------------------------------
bark_porosity = 0.55;           // vandfyldt andel af barken (antagelse)
pump_ml_min   = 75;             // Kamoer NKP-DC-S10B: 70-80 ml/min (forhandlere)

// Soak-volumen: vand i potten (bark) + spalten + under potten
function frustum_v(r1, r2, h) = PI * h / 3 * (r1*r1 + r1*r2 + r2*r2);
pot_water_ml  = frustum_v(pot_r(0) - 1.5, pot_r(soak_depth) - 1.5, soak_depth)
                * bark_porosity / 1000;
gap_water_ml  = (frustum_v(bowl_r_in_bottom, bowl_r_in_top, soak_depth)
                 - frustum_v(pot_r(0), pot_r(soak_depth), soak_depth)) / 1000;
under_pot_ml  = PI * pow(bowl_r_in_bottom, 2) * feet_h / 1000;
soak_volume_ml = pot_water_ml + gap_water_ml + under_pot_ml;

// Lager-ring: ringvolumen fra gulv til overløb minus skålens ydre og skakten
ring_h = ring_overflow_z - tank_floor_t;
bowl_outer_v = frustum_v(bowl_r_in_bottom + bowl_wall,
                         pot_r(ring_overflow_z - z_pot_bottom) + bowl_gap + bowl_wall,
                         ring_h);
ring_capacity_ml = (PI * pow(ring_outer_r, 2) * ring_h - bowl_outer_v
                    - PI * pow(conduit_od / 2, 2) * ring_h) / 1000;

total_h_to_lid = bay_h + ring_wall_h + lid_t;
pot_top_z      = bay_h + z_pot_bottom + pot_h;

echo("=== Pot-Orchid v1 (ADR 012) ===");
echo("soak-volumen (BEREGNET):", soak_volume_ml, "ml");
echo("lager-ring (BEREGNET):", ring_capacity_ml, "ml");
echo("reserve efter én soak:", ring_capacity_ml - soak_volume_ml, "ml");
echo("fyld/dræn pr. retning:", soak_volume_ml / pump_ml_min, "min");
echo("højde til ring-låg:", total_h_to_lid, "mm");
echo("pottens top:", pot_top_z, "mm  (pyntepotte indv. ca.", cachepot_inner_h, "mm)");
echo("tårn Ø:", tower_d, "mm  (pyntepotte max", cachepot_max_pot_d, "mm)");
// main file
// =============================================================================
// Ring-låg — dækker lager-ringen og skålens kant (ADR 012)
// =============================================================================
// Hviler på ringens ydervæg med en læbe indenfor. Går fri af dyrkningspotten
// (2mm), så potten kan løftes op uden at fjerne låget. Påfyldningshul ved
// 270° direkte over ringen — man kan fylde på uden at løfte planten.
// Slanger går under låget fra skaktens top til skålens slange-kanal.
//
// PRINT: opak PETG, på HOVEDET (læben opad) — ingen support.
// =============================================================================

include <params.scad>

lip_t = 1.5;
lip_h = 3;

module ring_lid() {
    difference() {
        union() {
            cylinder(r = tower_d / 2, h = lid_t);
            // Læbe ned i ringen (centrerer låget)
            translate([0, 0, -lip_h])
                difference() {
                    cylinder(r = ring_outer_r - print_tolerance, h = lip_h);
                    translate([0, 0, -1])
                        cylinder(r = ring_outer_r - print_tolerance - lip_t, h = lip_h + 2);
                }
        }
        translate([0, 0, -lip_h - 1])
            cylinder(r = lid_inner_r, h = lid_t + lip_h + 2);
        // Påfyldningshul over ringen
        rotate([0, 0, refill_angle])
            translate([(bowl_r_in_top + bowl_wall + ring_outer_r) / 2, 0, -lip_h - 1])
                cylinder(d = refill_hole_d, h = lid_t + lip_h + 2);
    }
}

ring_lid();
